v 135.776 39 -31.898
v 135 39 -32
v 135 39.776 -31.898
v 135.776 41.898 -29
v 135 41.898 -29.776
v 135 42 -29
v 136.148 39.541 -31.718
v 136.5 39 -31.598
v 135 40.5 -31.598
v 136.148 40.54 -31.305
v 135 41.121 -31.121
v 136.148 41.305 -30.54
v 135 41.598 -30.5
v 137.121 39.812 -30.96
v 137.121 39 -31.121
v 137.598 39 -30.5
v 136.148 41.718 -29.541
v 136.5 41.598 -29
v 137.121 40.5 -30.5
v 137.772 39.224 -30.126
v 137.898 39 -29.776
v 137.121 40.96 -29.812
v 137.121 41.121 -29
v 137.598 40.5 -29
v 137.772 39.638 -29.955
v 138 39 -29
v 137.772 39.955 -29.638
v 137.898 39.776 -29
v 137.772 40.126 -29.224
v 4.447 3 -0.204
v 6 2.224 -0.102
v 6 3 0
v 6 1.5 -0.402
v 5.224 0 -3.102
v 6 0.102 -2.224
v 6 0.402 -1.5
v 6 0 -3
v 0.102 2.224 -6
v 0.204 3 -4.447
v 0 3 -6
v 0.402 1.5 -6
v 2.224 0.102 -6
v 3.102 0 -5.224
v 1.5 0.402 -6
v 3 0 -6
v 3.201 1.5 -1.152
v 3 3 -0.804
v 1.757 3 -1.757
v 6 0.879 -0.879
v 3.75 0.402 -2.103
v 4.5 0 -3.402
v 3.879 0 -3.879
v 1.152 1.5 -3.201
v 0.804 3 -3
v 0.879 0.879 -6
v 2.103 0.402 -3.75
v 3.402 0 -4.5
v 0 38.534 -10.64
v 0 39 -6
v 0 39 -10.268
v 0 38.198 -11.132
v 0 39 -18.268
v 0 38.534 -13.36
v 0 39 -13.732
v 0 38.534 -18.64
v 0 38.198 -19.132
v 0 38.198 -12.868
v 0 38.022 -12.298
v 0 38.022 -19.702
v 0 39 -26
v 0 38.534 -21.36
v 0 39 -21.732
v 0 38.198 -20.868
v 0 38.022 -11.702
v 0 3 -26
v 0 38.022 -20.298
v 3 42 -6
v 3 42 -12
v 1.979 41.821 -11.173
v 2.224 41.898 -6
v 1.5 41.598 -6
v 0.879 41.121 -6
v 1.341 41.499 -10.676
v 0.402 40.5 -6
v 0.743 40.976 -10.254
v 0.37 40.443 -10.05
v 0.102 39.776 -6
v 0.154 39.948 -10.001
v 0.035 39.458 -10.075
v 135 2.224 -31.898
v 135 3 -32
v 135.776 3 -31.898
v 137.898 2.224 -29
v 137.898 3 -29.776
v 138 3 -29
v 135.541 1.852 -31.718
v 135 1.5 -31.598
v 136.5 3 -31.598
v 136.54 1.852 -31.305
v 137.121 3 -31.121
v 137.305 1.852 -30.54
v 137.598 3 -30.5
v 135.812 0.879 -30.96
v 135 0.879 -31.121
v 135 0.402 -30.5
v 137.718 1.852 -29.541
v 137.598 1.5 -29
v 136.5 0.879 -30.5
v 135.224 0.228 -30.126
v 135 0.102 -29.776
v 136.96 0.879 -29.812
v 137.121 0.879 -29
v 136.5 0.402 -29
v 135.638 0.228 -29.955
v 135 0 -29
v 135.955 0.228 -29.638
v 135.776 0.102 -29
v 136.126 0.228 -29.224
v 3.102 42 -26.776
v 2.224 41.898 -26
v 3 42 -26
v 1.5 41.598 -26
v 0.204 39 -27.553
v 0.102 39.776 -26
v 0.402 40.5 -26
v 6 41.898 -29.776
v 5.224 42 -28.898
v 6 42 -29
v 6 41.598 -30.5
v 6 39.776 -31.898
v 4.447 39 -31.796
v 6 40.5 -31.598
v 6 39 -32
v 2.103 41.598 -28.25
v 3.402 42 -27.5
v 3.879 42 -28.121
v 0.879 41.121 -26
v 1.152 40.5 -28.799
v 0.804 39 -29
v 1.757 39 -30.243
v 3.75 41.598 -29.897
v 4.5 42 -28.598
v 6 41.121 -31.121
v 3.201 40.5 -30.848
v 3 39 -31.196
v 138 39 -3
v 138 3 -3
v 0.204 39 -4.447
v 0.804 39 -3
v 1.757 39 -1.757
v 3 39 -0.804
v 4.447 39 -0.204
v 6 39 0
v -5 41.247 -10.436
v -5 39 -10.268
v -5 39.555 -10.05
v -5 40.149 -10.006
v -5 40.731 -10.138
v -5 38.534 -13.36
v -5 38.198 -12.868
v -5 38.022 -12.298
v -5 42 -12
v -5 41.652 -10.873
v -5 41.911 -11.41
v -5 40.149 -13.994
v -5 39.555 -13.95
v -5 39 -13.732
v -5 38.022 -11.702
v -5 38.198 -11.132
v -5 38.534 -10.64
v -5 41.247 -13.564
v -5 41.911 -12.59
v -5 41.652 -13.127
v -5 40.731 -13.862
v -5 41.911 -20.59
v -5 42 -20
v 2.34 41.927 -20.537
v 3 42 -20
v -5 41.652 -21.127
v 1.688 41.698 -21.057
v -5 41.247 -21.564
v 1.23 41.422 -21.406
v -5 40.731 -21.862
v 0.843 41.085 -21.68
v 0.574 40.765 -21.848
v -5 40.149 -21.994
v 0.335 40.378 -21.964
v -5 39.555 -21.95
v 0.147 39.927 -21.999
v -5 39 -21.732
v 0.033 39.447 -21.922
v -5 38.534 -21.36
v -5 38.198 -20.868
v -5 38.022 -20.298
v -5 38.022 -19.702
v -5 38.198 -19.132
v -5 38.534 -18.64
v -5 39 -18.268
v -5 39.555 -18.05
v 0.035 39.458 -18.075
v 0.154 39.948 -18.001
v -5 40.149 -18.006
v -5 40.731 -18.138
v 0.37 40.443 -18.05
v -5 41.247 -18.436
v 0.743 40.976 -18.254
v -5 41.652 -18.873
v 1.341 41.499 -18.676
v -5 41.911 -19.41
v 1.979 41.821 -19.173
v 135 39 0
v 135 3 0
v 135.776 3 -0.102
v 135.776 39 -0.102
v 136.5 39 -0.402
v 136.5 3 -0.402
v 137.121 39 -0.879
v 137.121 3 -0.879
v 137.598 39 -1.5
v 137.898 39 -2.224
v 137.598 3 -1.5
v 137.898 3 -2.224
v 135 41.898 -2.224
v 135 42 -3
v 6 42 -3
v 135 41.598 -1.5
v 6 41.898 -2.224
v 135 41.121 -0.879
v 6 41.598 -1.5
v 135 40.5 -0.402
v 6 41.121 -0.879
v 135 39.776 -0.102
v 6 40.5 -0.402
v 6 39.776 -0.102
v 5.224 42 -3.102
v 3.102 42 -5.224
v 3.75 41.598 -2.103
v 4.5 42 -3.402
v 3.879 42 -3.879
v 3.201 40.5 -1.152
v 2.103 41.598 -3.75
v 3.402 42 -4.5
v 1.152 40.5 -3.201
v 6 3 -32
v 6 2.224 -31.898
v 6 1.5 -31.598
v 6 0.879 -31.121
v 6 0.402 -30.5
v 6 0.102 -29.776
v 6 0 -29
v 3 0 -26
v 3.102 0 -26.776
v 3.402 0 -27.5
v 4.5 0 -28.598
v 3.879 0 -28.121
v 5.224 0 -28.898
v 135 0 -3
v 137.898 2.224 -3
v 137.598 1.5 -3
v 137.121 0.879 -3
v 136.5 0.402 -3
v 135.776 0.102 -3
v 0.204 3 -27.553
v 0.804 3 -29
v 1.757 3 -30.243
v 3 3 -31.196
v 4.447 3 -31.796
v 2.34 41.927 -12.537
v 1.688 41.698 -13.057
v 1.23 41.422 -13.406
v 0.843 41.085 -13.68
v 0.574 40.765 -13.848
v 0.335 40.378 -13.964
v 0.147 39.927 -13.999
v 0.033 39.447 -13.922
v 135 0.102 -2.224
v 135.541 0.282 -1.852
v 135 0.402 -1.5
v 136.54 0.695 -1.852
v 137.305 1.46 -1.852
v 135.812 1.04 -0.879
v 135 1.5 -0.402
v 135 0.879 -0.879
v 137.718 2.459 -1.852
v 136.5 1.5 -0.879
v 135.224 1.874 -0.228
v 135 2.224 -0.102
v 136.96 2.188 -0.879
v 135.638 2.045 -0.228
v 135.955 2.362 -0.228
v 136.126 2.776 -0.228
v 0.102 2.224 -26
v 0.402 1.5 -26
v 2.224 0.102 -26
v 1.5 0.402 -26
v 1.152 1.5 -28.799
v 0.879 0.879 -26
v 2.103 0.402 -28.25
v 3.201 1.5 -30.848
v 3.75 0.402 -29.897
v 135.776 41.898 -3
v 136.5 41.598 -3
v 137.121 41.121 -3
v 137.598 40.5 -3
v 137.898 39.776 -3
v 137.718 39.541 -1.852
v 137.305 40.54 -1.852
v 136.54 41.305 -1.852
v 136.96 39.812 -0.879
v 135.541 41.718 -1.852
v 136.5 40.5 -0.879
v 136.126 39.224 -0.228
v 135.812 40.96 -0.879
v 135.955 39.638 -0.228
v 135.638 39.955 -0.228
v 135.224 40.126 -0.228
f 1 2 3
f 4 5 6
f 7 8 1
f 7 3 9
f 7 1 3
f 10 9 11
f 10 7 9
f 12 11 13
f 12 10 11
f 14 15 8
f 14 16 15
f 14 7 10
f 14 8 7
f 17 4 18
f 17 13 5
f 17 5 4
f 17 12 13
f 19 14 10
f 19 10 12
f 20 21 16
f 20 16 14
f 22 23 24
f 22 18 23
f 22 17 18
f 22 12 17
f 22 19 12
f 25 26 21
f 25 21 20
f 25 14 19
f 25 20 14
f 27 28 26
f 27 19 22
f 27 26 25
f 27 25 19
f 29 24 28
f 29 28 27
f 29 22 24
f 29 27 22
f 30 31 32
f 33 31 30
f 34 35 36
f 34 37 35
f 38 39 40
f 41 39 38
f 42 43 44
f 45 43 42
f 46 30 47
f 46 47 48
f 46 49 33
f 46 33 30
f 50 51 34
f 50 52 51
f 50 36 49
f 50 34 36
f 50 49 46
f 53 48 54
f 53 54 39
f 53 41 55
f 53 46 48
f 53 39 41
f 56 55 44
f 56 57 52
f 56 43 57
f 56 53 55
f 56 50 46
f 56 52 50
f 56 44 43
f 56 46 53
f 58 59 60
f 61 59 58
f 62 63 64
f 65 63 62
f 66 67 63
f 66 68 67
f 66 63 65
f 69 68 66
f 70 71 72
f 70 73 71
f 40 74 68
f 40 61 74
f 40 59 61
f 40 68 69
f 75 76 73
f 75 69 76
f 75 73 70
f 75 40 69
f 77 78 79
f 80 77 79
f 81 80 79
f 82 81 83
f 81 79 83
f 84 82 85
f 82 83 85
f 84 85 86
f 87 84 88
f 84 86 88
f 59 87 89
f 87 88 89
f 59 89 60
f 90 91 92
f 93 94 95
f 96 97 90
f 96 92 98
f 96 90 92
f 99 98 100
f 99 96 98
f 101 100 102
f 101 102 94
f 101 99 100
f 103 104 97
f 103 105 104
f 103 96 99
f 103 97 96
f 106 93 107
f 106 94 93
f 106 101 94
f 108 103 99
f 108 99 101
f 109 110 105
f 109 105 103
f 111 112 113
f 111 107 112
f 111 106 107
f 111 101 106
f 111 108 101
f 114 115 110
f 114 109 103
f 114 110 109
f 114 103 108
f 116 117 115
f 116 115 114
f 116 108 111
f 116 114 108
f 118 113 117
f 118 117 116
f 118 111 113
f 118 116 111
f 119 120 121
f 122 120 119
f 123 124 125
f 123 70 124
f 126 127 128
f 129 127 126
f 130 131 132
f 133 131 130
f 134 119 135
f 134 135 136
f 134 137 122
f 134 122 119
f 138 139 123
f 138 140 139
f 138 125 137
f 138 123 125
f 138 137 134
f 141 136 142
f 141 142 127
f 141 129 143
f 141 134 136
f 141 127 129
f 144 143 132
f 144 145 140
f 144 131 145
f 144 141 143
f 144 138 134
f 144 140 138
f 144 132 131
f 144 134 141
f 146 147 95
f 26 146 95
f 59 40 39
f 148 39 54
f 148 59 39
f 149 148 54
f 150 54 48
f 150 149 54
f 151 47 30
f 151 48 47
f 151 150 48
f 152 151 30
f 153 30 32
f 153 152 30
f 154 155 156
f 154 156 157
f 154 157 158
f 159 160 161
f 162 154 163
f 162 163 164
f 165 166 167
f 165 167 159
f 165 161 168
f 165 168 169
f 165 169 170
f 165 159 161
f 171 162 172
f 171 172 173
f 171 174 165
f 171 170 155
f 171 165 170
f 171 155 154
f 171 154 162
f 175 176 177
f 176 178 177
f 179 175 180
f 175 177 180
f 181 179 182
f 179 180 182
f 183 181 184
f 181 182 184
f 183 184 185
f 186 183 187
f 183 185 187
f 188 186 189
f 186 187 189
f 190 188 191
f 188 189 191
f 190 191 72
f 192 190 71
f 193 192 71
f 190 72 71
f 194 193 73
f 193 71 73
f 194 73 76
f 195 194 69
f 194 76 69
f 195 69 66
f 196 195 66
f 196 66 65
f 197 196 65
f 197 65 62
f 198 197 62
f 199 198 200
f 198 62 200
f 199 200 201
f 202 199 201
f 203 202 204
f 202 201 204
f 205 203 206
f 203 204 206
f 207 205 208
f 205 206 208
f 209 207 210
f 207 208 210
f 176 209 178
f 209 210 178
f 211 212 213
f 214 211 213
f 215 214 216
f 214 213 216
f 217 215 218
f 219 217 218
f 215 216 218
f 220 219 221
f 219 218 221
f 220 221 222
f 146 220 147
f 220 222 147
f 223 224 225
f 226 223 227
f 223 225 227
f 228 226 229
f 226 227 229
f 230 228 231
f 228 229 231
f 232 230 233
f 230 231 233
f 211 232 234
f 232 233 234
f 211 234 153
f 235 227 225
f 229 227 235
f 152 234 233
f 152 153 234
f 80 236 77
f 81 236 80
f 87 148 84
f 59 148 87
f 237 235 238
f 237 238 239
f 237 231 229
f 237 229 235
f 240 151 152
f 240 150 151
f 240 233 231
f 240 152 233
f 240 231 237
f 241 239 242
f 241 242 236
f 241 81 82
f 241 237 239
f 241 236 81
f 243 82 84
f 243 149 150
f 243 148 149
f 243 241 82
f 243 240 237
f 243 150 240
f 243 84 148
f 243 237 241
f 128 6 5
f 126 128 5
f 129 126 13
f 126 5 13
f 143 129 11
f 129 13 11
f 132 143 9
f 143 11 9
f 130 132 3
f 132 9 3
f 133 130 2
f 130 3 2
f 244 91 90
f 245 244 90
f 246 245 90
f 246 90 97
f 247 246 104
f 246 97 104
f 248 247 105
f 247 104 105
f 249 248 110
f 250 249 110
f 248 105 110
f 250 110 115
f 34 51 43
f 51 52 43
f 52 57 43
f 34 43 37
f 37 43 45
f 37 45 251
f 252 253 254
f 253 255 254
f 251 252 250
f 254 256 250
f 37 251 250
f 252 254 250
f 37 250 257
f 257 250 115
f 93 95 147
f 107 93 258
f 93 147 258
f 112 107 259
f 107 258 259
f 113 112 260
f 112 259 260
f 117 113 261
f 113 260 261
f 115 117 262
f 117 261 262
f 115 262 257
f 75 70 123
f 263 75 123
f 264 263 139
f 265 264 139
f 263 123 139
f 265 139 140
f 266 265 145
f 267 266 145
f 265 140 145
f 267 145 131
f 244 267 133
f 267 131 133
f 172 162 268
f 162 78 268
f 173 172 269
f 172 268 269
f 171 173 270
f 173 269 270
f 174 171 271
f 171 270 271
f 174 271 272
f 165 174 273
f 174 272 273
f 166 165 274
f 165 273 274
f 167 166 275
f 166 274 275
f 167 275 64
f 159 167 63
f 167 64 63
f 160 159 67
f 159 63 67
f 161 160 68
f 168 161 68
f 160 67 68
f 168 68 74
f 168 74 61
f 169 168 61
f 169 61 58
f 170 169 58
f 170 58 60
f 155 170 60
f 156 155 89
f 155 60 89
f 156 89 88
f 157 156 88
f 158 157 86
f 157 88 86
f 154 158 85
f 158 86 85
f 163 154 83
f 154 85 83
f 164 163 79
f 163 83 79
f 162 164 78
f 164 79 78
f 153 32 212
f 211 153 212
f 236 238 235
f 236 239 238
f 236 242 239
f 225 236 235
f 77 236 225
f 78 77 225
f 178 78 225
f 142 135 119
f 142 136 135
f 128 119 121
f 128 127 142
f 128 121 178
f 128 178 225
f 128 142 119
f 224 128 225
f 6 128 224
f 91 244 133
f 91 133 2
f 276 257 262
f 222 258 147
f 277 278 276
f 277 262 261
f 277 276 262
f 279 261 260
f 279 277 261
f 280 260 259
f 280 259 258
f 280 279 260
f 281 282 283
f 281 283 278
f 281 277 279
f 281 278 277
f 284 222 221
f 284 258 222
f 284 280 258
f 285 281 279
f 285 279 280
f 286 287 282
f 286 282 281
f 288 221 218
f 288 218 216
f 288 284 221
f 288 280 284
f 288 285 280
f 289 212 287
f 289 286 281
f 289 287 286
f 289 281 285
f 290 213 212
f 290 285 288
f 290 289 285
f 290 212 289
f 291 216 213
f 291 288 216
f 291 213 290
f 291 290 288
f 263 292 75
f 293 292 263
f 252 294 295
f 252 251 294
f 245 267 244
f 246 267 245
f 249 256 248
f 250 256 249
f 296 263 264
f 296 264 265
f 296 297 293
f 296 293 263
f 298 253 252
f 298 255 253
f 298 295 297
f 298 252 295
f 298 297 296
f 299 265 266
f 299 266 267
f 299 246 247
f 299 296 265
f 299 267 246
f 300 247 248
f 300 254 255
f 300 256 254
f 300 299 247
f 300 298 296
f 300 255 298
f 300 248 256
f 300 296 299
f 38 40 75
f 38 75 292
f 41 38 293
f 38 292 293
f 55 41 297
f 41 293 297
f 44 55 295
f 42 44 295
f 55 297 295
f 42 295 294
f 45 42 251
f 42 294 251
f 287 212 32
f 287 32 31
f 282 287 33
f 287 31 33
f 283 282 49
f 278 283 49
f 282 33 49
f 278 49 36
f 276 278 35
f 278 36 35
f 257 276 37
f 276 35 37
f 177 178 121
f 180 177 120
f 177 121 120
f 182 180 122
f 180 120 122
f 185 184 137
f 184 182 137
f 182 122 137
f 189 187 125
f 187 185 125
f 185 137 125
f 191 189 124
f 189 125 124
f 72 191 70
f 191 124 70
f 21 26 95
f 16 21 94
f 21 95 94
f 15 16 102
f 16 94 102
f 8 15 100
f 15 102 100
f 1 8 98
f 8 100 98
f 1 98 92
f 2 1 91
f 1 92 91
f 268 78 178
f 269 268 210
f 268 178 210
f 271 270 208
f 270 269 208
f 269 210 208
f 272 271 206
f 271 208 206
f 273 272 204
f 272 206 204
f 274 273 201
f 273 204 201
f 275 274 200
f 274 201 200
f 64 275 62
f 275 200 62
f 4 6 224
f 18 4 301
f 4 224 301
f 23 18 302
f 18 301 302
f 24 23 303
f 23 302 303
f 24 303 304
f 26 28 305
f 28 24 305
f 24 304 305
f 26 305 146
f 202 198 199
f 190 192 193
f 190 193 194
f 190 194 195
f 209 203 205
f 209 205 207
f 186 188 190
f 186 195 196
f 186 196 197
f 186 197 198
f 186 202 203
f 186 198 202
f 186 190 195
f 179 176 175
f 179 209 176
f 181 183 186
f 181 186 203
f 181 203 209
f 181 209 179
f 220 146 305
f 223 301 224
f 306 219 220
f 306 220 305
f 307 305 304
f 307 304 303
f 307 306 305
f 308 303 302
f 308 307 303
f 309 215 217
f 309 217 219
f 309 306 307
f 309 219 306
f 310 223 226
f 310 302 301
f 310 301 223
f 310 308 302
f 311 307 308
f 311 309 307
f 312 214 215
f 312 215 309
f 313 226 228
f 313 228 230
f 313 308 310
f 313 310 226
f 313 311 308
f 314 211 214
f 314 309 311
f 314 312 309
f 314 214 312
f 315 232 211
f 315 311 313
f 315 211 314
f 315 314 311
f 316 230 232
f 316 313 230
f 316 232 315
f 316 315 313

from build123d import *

# Parameters (mm, degrees)
SKETCH1_W           = 138
SKETCH1_H           = 32
BOSS_EXTRUDE1_DEPTH = 42
SKETCH2_R           = 2
BOSS_EXTRUDE2_DEPTH = 5
FILLET1_R           = 6
FILLET2_R           = 3


with BuildPart() as part:
    # Sketch1 → Boss-Extrude1 (new body)
    with BuildSketch(Plane(origin=(0, 0, 0), x_dir=(1, 0, 0), z_dir=(0, 1, 0))):
        with Locations((69, 16)):
            Rectangle(SKETCH1_W, SKETCH1_H)
    extrude(amount=BOSS_EXTRUDE1_DEPTH)

    # Sketch2 → Boss-Extrude2 (add)
    with BuildSketch(Plane.ZY):
        with Locations(Location((-12, 40, 0), (0, 0, 90))):
            Circle(SKETCH2_R)
        with Locations(Location((-20, 40, 0), (0, 0, 90))):
            Circle(SKETCH2_R)
    extrude(amount=BOSS_EXTRUDE2_DEPTH)

    # Fillet1
    fillet1_edges = [part.edges().sort_by_distance(p)[0] for p in [
        (0, 21, -32),
        (0, 21, 0),
    ]]
    fillet(fillet1_edges, radius=FILLET1_R)

    # Fillet2
    # the kernel refuses this fillet: 3 mm, written as the material it takes off along each edge
    with BuildSketch(Plane(origin=(135, 39, -3), x_dir=(1, 0, 0), z_dir=(0, 0, 1))) as fillet2_piece_1_section:
        Polygon((0, 0), (FILLET2_R * 1.02, 0), (FILLET2_R * 1.02, FILLET2_R * 1.02), (0, FILLET2_R * 1.02), align=None)
    fillet2_piece_1 = extrude(amount=FILLET2_R * 1.02, mode=Mode.PRIVATE)
    fillet2_piece_1 = fillet2_piece_1 - Plane(origin=(135, 39, -3), x_dir=(-0.7071067811865475, -0.7071067811865475, 0), z_dir=(0, 0, 1)) * Sphere(FILLET2_R, mode=Mode.PRIVATE)
    add(fillet2_piece_1, mode=Mode.SUBTRACT)
    with BuildSketch(Plane(origin=(135, 39, -29), x_dir=(0, 1, 0), z_dir=(1, 0, 0))) as fillet2_piece_2_section:
        Polygon((0, 0), (FILLET2_R * 1.02, 0), (FILLET2_R * 1.02, -FILLET2_R * 1.02), (0, -FILLET2_R * 1.02), align=None)
    fillet2_piece_2 = extrude(amount=FILLET2_R * 1.02, mode=Mode.PRIVATE)
    fillet2_piece_2 = fillet2_piece_2 - Plane(origin=(135, 39, -29), x_dir=(0, -0.7071067811865475, 0.7071067811865475), z_dir=(1, 0, 0)) * Sphere(FILLET2_R, mode=Mode.PRIVATE)
    add(fillet2_piece_2, mode=Mode.SUBTRACT)
    with BuildSketch(Plane(origin=(135, 3, -3), x_dir=(0, -1, 0), z_dir=(0, 0, 1))) as fillet2_piece_3_section:
        Polygon((0, 0), (FILLET2_R * 1.02, 0), (FILLET2_R * 1.02, FILLET2_R * 1.02), (0, FILLET2_R * 1.02), align=None)
    fillet2_piece_3 = extrude(amount=FILLET2_R * 1.02, mode=Mode.PRIVATE)
    fillet2_piece_3 = fillet2_piece_3 - Plane(origin=(135, 3, -3), x_dir=(-0.7071067811865475, 0.7071067811865475, 0), z_dir=(0, 0, 1)) * Sphere(FILLET2_R, mode=Mode.PRIVATE)
    add(fillet2_piece_3, mode=Mode.SUBTRACT)
    with BuildSketch(Plane(origin=(135, 3, -29), x_dir=(1, 0, 0), z_dir=(0, -1, 0))) as fillet2_piece_4_section:
        Polygon((0, 0), (FILLET2_R * 1.02, 0), (FILLET2_R * 1.02, -FILLET2_R * 1.02), (0, -FILLET2_R * 1.02), align=None)
    fillet2_piece_4 = extrude(amount=FILLET2_R * 1.02, mode=Mode.PRIVATE)
    fillet2_piece_4 = fillet2_piece_4 - Plane(origin=(135, 3, -29), x_dir=(-0.7071067811865475, 0, 0.7071067811865475), z_dir=(0, -1, 0)) * Sphere(FILLET2_R, mode=Mode.PRIVATE)
    add(fillet2_piece_4, mode=Mode.SUBTRACT)
    with BuildSketch(Plane(origin=(138, 42, -3), x_dir=(0, -1, 0), z_dir=(0, 0, -1)), Plane(origin=(138, 0, -3), x_dir=(-1, 0, 0), z_dir=(0, 0, -1))) as fillet2_piece_5:
        with BuildLine():
            CenterArc((FILLET2_R, FILLET2_R), FILLET2_R, 180, 90)
            Line((0, FILLET2_R), (0, 0))
            Line((0, 0), (FILLET2_R, 0))
        make_face()
    extrude(amount=26, mode=Mode.SUBTRACT)
    with BuildSketch(Plane(origin=(0, 42, -12), x_dir=(1, 0, 0), z_dir=(0, 0, 1))) as fillet2_piece_6_section:
        with BuildLine():
            CenterArc((FILLET2_R, -FILLET2_R), FILLET2_R, 90, 90)
            Line((0, -FILLET2_R), (0, 0))
            Line((0, 0), (FILLET2_R, 0))
        make_face()
    fillet2_piece_6 = extrude(amount=6, mode=Mode.PRIVATE)
    fillet2_piece_6 = fillet2_piece_6 - Plane(origin=(0.483529934, 40, -12), x_dir=(0, 1, 0), z_dir=(1, 0, 0)) * Cylinder(2, 24, mode=Mode.PRIVATE)
    add(fillet2_piece_6, mode=Mode.SUBTRACT)
    with BuildSketch(Plane(origin=(135, 42, -32), x_dir=(0, 0, 1), z_dir=(-1, 0, 0)), Plane(origin=(6, 0, 0), x_dir=(0, 1, 0), z_dir=(1, 0, 0))) as fillet2_piece_7:
        with BuildLine():
            CenterArc((FILLET2_R, -FILLET2_R), FILLET2_R, 90, 90)
            Line((0, -FILLET2_R), (0, 0))
            Line((0, 0), (FILLET2_R, 0))
        make_face()
    extrude(amount=129, mode=Mode.SUBTRACT)
    with BuildSketch(Plane(origin=(0, 42, -20), x_dir=(1, 0, 0), z_dir=(0, 0, 1))) as fillet2_piece_8_section:
        with BuildLine():
            CenterArc((FILLET2_R, -FILLET2_R), FILLET2_R, 90, 90)
            Line((0, -FILLET2_R), (0, 0))
            Line((0, 0), (FILLET2_R, 0))
        make_face()
    fillet2_piece_8 = extrude(amount=8, mode=Mode.PRIVATE)
    fillet2_piece_8 = fillet2_piece_8 - Plane(origin=(0.736023116, 40, -20), x_dir=(0, 1, 0), z_dir=(1, 0, 0)) * Cylinder(2, 28, mode=Mode.PRIVATE)
    fillet2_piece_8 = fillet2_piece_8 - Plane(origin=(0.736023116, 40, -12), x_dir=(0, 1, 0), z_dir=(1, 0, 0)) * Cylinder(2, 28, mode=Mode.PRIVATE)
    add(fillet2_piece_8, mode=Mode.SUBTRACT)
    with BuildSketch(Plane(origin=(0, 42, -26), x_dir=(1, 0, 0), z_dir=(0, 0, 1))) as fillet2_piece_9_section:
        with BuildLine():
            CenterArc((FILLET2_R, -FILLET2_R), FILLET2_R, 90, 90)
            Line((0, -FILLET2_R), (0, 0))
            Line((0, 0), (FILLET2_R, 0))
        make_face()
    fillet2_piece_9 = extrude(amount=6, mode=Mode.PRIVATE)
    fillet2_piece_9 = fillet2_piece_9 - Plane(origin=(0.914317851, 40, -20), x_dir=(0, 1, 0), z_dir=(1, 0, 0)) * Cylinder(2, 24, mode=Mode.PRIVATE)
    add(fillet2_piece_9, mode=Mode.SUBTRACT)
    with BuildSketch(Plane(origin=(0, 0, -26), x_dir=(1, 0, 0), z_dir=(0, 0, 1))) as fillet2_piece_10:
        with BuildLine():
            CenterArc((FILLET2_R, FILLET2_R), FILLET2_R, 180, 90)
            Line((0, FILLET2_R), (0, 0))
            Line((0, 0), (FILLET2_R, 0))
        make_face()
    extrude(amount=20, mode=Mode.SUBTRACT)
    with BuildSketch(Plane(origin=(6, 0, -6), x_dir=(0, 0, 1), z_dir=(1, 0, 0))) as fillet2_piece_11:
        with BuildLine():
            CenterArc((6 - FILLET2_R, -FILLET2_R), FILLET2_R, 0, 90)
            Line((6, -FILLET2_R), (6, 0))
            Line((6, 0), (6 - FILLET2_R, 0))
        make_face()
    revolve(axis=Axis((6, 0, -6), (0, -1, 0)), revolution_arc=90, mode=Mode.SUBTRACT)
    with BuildSketch(Plane(origin=(6, 0, -26), x_dir=(-1, 0, 0), z_dir=(0, 0, 1))) as fillet2_piece_12:
        with BuildLine():
            CenterArc((6 - FILLET2_R, -FILLET2_R), FILLET2_R, 0, 90)
            Line((6, -FILLET2_R), (6, 0))
            Line((6, 0), (6 - FILLET2_R, 0))
        make_face()
    revolve(axis=Axis((6, 0, -26), (0, -1, 0)), revolution_arc=90, mode=Mode.SUBTRACT)
    with BuildSketch(Plane(origin=(6, 42, 0), x_dir=(0, -1, 0), z_dir=(1, 0, 0)), Plane(origin=(135, 0, -32), x_dir=(0, 0, 1), z_dir=(-1, 0, 0))) as fillet2_piece_13:
        with BuildLine():
            CenterArc((FILLET2_R, FILLET2_R), FILLET2_R, 180, 90)
            Line((0, FILLET2_R), (0, 0))
            Line((0, 0), (FILLET2_R, 0))
        make_face()
    extrude(amount=129, mode=Mode.SUBTRACT)
    with BuildSketch(Plane(origin=(6, 42, -6), x_dir=(0, 0, 1), z_dir=(1, 0, 0))) as fillet2_piece_14:
        with BuildLine():
            CenterArc((6 - FILLET2_R, FILLET2_R), FILLET2_R, 270, 90)
            Line((6 - FILLET2_R, 0), (6, 0))
            Line((6, 0), (6, FILLET2_R))
        make_face()
    revolve(axis=Axis((6, 42, -6), (0, -1, 0)), revolution_arc=90, mode=Mode.SUBTRACT)
    with BuildSketch(Plane(origin=(6, 42, -26), x_dir=(-1, 0, 0), z_dir=(0, 0, 1))) as fillet2_piece_15:
        with BuildLine():
            CenterArc((6 - FILLET2_R, FILLET2_R), FILLET2_R, 270, 90)
            Line((6, FILLET2_R), (6, 0))
            Line((6, 0), (6 - FILLET2_R, 0))
        make_face()
    revolve(axis=Axis((6, 42, -26), (0, -1, 0)), revolution_arc=90, mode=Mode.SUBTRACT)
    with BuildSketch(Plane(origin=(138, 3, -32), x_dir=(0, 0, 1), z_dir=(0, 1, 0)), Plane(origin=(138, 3, 0), x_dir=(-1, 0, 0), z_dir=(0, 1, 0))) as fillet2_piece_16:
        with BuildLine():
            CenterArc((FILLET2_R, -FILLET2_R), FILLET2_R, 90, 90)
            Line((0, -FILLET2_R), (0, 0))
            Line((0, 0), (FILLET2_R, 0))
        make_face()
    extrude(amount=36, mode=Mode.SUBTRACT)


solid = part.part
